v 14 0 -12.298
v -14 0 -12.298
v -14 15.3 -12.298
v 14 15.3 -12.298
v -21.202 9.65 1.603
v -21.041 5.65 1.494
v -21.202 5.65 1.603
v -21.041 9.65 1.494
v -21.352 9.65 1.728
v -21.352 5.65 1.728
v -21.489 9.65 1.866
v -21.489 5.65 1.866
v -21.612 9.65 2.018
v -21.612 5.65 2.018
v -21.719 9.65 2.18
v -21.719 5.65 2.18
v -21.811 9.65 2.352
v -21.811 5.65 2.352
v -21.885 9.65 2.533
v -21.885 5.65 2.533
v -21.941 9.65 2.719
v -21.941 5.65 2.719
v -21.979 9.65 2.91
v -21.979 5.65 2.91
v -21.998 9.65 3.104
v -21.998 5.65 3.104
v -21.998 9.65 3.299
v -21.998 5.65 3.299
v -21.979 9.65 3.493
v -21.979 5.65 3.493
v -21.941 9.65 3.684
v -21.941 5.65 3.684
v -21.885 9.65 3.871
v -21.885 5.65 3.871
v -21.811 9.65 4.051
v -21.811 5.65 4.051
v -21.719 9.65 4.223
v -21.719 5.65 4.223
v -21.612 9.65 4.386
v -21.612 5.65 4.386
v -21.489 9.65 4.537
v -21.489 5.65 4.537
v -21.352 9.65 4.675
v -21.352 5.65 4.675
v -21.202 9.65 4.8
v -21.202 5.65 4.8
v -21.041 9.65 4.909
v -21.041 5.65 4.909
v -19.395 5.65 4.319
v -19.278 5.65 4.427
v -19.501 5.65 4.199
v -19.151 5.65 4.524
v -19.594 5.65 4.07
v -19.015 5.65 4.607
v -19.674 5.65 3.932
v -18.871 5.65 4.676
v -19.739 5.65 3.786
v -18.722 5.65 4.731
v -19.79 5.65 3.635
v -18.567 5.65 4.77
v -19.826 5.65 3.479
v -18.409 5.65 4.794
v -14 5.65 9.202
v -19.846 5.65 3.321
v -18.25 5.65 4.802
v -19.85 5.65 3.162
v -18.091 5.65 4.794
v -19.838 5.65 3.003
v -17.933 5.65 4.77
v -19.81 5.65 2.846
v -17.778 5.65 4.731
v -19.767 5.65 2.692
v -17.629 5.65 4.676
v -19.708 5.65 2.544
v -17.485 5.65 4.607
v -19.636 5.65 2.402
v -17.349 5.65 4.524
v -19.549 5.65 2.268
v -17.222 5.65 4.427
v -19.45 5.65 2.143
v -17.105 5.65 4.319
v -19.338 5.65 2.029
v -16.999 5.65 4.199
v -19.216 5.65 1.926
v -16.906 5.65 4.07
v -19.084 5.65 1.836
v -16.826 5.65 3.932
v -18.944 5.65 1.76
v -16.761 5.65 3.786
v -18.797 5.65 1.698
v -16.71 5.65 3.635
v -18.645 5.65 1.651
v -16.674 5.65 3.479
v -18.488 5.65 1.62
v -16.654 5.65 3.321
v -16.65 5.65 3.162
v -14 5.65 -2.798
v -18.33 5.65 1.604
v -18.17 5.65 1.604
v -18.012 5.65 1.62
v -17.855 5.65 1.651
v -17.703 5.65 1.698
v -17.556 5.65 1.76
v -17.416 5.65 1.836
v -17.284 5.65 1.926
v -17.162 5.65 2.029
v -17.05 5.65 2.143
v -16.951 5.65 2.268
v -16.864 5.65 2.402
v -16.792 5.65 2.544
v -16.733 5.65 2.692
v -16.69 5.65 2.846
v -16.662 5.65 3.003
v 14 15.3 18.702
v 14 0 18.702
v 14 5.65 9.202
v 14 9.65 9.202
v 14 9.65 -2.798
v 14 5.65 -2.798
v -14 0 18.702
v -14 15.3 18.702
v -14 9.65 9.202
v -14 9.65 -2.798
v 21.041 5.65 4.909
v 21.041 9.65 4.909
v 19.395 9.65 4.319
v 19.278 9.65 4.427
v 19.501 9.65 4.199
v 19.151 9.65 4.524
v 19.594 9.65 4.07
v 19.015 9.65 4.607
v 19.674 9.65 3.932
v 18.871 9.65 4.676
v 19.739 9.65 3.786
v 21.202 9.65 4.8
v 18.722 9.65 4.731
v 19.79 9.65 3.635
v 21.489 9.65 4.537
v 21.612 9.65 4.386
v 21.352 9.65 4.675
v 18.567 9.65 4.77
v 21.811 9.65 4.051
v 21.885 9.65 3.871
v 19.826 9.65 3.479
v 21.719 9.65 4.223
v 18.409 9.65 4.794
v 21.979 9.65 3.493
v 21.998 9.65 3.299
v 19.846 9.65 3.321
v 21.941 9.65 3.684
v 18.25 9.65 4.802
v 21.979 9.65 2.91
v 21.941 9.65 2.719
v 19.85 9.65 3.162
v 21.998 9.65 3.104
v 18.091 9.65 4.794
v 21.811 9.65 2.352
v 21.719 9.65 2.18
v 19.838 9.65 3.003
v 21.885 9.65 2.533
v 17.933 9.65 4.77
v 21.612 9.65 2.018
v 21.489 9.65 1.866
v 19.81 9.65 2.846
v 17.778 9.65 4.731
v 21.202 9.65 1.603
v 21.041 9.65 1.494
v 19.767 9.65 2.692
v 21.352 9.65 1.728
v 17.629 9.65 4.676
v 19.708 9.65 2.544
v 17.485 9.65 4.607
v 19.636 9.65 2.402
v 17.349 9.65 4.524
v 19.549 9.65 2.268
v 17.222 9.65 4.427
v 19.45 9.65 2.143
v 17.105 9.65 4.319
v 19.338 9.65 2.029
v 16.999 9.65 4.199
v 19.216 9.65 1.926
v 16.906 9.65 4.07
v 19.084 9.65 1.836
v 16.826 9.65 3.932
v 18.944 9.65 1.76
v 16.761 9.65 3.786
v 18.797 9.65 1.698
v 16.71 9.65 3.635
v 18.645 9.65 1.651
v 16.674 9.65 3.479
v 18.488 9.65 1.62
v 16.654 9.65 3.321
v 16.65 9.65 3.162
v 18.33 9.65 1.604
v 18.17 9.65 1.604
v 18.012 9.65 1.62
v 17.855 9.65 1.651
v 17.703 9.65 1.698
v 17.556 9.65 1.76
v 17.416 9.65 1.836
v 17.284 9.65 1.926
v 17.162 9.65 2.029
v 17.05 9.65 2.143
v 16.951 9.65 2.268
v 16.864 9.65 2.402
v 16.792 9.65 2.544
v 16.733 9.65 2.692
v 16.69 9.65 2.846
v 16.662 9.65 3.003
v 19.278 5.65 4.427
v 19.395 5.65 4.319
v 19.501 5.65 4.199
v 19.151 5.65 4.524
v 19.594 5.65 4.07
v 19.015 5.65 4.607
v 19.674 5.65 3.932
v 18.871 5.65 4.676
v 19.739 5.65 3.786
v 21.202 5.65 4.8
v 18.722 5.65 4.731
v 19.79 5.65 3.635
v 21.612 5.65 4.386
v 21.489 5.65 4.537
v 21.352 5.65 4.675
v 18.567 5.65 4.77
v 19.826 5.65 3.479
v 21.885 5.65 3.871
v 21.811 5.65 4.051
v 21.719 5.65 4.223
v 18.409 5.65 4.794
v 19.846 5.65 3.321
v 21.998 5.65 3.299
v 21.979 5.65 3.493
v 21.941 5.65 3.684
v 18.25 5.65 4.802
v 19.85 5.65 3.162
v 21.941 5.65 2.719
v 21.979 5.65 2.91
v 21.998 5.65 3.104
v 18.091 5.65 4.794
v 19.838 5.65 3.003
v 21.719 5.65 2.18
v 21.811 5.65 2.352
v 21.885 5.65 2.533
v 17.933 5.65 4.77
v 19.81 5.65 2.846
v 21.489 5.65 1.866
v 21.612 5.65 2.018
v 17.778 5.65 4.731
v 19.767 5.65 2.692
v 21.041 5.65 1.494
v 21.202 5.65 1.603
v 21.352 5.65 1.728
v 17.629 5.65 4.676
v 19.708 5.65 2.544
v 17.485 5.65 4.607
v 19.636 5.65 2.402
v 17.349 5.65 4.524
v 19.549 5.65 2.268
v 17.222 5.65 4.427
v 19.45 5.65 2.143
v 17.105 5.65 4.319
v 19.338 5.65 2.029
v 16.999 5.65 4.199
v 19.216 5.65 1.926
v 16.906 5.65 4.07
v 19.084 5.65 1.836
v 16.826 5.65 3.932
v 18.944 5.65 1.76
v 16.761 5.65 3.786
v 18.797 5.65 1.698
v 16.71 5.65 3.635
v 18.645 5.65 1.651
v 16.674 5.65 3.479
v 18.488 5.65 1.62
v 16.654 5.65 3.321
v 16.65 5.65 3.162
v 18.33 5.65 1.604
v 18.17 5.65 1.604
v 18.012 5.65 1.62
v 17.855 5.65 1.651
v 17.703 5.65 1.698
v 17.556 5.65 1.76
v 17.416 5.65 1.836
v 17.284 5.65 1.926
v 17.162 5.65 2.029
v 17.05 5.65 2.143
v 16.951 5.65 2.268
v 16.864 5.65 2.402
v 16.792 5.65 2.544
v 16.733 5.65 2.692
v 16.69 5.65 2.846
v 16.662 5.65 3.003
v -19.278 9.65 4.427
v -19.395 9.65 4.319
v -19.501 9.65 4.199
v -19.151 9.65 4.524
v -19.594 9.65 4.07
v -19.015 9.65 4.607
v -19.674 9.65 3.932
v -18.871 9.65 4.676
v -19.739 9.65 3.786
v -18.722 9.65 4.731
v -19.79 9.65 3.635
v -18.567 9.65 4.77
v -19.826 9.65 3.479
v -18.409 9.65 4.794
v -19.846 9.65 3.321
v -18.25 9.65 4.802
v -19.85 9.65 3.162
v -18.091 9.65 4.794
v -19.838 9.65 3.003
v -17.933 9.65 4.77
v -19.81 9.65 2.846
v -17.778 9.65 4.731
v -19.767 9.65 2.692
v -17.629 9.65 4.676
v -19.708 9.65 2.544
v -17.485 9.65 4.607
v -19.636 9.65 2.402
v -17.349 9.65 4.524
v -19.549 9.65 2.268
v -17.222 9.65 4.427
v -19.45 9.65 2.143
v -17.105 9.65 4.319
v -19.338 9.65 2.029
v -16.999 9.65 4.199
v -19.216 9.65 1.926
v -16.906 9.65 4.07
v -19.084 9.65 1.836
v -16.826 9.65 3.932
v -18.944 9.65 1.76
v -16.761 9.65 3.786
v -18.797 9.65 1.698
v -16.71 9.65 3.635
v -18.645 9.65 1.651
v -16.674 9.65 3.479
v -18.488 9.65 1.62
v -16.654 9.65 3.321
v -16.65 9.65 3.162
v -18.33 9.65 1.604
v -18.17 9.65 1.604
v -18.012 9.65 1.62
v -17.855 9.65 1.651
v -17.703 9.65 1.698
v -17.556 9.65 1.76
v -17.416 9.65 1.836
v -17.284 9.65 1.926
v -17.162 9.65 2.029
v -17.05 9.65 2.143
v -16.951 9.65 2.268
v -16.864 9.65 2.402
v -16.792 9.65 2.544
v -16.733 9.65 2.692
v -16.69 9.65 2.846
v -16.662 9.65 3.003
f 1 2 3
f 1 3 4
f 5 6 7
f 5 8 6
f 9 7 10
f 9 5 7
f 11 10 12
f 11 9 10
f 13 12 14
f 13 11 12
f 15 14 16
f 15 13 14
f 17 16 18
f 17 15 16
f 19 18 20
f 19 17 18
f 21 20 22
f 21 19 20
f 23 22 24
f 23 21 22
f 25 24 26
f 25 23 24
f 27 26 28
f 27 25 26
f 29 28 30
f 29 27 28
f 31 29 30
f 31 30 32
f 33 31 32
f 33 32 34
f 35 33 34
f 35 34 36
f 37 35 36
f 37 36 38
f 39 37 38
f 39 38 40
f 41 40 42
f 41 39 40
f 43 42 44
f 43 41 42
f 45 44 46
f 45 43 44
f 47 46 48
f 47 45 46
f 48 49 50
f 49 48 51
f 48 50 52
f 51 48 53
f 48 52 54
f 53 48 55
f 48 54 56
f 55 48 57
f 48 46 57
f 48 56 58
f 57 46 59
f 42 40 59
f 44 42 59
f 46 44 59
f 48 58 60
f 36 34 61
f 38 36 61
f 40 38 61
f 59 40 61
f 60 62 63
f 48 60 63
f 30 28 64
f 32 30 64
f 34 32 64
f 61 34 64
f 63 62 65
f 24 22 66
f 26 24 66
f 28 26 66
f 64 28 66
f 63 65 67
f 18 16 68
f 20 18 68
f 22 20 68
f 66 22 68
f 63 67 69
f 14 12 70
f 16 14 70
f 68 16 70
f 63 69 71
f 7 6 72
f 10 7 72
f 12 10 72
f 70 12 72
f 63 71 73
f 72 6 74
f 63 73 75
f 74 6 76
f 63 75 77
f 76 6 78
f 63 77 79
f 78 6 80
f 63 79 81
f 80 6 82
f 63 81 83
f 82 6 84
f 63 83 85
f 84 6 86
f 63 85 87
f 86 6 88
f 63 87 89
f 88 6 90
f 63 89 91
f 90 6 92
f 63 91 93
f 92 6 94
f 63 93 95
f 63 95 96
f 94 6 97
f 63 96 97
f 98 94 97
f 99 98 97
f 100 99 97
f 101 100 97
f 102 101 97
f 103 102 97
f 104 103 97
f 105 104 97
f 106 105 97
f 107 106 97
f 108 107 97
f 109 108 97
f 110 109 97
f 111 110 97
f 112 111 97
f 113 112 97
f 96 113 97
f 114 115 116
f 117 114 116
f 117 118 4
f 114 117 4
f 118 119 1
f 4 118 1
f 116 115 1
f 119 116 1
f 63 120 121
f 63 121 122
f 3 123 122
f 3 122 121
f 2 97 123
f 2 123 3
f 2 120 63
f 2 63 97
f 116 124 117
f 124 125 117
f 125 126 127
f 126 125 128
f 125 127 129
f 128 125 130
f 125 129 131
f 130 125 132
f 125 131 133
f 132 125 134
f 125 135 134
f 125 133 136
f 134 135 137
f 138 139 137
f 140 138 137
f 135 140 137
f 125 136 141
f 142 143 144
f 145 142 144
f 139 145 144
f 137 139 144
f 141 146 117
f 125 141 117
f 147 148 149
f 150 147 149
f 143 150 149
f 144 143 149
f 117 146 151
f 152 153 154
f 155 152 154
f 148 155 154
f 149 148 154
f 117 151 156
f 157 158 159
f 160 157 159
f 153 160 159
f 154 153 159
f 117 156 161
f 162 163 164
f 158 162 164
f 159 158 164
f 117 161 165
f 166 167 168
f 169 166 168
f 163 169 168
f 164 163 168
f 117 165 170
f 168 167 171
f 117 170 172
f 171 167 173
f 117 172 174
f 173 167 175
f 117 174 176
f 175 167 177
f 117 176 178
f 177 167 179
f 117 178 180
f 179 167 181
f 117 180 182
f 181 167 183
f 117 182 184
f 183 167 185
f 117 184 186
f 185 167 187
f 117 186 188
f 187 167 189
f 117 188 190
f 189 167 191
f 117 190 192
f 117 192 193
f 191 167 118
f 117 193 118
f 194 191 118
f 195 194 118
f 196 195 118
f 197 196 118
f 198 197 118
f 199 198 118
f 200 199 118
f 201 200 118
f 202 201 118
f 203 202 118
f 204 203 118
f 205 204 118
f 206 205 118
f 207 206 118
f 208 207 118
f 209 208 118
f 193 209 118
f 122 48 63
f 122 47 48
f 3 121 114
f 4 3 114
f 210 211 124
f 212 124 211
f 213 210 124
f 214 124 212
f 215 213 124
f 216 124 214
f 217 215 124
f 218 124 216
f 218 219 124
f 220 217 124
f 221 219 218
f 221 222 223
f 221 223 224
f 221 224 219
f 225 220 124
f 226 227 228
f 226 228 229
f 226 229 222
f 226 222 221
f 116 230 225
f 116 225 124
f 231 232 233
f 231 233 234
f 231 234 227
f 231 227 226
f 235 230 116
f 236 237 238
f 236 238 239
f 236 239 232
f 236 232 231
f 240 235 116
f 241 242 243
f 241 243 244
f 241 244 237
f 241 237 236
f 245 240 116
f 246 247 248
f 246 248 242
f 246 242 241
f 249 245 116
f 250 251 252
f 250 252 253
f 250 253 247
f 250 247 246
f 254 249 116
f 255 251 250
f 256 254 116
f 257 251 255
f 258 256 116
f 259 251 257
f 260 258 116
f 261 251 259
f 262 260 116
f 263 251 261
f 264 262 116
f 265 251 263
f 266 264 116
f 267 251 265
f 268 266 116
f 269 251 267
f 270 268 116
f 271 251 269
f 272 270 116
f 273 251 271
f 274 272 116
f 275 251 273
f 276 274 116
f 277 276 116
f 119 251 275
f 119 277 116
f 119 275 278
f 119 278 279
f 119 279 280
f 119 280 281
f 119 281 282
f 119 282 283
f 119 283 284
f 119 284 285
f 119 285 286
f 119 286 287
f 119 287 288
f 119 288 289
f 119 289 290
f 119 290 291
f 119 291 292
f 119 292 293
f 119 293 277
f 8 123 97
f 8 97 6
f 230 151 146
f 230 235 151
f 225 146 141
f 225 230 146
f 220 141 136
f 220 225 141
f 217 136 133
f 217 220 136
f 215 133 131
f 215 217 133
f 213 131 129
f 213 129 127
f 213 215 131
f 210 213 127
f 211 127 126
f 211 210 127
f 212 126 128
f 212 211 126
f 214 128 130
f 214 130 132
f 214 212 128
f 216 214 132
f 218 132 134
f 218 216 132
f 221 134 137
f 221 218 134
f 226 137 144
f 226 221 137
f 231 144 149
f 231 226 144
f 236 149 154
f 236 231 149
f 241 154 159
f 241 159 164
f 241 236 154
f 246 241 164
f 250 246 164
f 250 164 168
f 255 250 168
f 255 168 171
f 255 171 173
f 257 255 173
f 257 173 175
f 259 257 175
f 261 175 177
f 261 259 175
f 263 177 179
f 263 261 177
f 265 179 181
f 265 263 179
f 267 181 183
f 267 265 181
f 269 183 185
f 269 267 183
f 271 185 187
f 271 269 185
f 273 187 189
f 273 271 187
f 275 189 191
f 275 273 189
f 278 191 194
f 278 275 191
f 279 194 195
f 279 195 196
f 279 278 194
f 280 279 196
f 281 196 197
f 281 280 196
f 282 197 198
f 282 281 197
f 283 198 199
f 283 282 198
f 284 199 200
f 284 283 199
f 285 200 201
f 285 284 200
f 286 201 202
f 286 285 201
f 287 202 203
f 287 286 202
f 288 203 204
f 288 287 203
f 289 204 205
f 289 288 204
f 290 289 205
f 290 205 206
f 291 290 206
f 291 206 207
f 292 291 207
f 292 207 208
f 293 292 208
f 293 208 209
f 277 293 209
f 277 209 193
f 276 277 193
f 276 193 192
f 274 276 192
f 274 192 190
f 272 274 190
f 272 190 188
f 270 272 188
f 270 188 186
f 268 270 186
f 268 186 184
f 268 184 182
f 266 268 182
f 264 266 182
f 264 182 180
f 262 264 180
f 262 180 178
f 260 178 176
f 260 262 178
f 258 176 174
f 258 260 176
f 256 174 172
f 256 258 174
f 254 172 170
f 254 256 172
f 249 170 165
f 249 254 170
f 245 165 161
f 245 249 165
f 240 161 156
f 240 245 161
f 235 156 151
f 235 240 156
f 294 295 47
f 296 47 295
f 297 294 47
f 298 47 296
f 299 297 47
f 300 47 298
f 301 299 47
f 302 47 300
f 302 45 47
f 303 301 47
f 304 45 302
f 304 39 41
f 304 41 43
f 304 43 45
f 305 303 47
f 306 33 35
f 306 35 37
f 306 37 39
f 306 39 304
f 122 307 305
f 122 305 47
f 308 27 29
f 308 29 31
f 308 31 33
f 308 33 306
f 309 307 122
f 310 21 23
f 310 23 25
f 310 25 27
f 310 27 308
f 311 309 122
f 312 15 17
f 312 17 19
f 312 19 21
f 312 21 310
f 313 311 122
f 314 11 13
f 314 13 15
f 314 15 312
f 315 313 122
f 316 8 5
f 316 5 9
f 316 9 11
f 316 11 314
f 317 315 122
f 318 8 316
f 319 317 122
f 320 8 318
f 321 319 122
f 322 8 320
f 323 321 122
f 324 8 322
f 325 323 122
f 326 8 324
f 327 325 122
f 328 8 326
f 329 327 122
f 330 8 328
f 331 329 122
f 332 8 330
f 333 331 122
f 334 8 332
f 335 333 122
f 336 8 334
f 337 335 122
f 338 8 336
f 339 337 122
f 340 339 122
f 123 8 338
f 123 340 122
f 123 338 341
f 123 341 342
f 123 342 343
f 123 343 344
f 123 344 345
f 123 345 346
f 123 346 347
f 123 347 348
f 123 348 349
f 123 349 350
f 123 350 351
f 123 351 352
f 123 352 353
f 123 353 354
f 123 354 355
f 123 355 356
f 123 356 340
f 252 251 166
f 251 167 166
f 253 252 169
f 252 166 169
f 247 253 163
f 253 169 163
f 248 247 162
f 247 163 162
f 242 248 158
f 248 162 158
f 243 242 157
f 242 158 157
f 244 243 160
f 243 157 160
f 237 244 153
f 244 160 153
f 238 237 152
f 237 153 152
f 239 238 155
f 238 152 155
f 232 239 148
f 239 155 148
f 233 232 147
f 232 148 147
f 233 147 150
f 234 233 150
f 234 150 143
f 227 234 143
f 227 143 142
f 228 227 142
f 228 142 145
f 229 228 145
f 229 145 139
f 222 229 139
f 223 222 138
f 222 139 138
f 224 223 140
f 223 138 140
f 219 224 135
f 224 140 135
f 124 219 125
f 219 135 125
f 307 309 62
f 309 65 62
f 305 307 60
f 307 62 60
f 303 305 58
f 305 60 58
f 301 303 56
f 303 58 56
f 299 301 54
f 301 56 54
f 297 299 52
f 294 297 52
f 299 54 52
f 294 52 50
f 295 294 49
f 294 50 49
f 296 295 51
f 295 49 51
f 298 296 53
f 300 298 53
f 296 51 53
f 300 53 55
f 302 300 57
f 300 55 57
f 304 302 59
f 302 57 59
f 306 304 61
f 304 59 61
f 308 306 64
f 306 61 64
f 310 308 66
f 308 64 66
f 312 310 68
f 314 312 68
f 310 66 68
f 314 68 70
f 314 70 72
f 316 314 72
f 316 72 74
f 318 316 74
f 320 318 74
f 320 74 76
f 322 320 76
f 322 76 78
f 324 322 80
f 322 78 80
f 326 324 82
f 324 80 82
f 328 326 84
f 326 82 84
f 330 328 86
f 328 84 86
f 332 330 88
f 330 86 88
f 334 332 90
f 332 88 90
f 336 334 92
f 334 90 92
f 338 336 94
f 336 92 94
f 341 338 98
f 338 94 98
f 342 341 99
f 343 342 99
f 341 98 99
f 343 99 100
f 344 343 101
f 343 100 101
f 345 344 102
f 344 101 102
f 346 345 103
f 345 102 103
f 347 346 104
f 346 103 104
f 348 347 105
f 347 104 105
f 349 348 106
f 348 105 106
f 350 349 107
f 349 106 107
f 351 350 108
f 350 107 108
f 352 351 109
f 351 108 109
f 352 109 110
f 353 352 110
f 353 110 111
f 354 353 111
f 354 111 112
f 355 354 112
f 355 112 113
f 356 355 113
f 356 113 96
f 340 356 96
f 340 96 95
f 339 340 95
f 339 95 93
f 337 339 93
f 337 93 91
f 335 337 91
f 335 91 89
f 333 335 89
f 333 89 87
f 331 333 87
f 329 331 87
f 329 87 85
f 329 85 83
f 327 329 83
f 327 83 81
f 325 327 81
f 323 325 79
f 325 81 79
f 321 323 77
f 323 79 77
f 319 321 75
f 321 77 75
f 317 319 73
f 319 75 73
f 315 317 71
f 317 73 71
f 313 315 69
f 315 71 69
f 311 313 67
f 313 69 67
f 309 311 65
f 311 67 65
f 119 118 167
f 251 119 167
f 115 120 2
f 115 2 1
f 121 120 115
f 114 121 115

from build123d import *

# Parameters (mm, degrees)
SKETCH_1_W      = 28
SKETCH_1_H      = 31
EXTRUDE_1_DEPTH = 15.3
SKETCH_2_R      = 1.6
EXTRUDE_2_DEPTH = 2


with BuildPart() as part:
    # 草图1 → 凸台-拉伸1 (new body)
    with BuildSketch(Plane(origin=(0, 0, 0), x_dir=(1, 0, 0), z_dir=(0, 1, 0))):
        with Locations((0, -3.201657459)):
            Rectangle(SKETCH_1_W, SKETCH_1_H)
    extrude(amount=EXTRUDE_1_DEPTH)

    # 草图2 → 凸台-拉伸2 (add, symmetric)
    with BuildSketch(Plane(origin=(0, 7.65, 0), x_dir=(1, 0, 0), z_dir=(0, 1, 0))):
        with BuildLine():
            Line((14, 2.798342541), (21.041035209, -1.493955583))
            ThreePointArc((21.041035209, -1.493955583), (22, -3.201657459), (21.041035209, -4.909359334))
            Line((21.041035209, -4.909359334), (14, -9.201657459))
            Line((14, -9.201657459), (14, 2.798342541))
        make_face()
        with Locations(Location((18.25, -3.201657459, 0), (0, 0, 270))):
            Circle(SKETCH_2_R, mode=Mode.SUBTRACT)
    extrude_2 = extrude(amount=EXTRUDE_2_DEPTH, both=True)

    # 镜向1: 凸台-拉伸2 across plane
    add(extrude_2.mirror(Plane(origin=(0, 0, 0), x_dir=(0, 0, 1), z_dir=(1, 0, 0))))


solid = part.part
